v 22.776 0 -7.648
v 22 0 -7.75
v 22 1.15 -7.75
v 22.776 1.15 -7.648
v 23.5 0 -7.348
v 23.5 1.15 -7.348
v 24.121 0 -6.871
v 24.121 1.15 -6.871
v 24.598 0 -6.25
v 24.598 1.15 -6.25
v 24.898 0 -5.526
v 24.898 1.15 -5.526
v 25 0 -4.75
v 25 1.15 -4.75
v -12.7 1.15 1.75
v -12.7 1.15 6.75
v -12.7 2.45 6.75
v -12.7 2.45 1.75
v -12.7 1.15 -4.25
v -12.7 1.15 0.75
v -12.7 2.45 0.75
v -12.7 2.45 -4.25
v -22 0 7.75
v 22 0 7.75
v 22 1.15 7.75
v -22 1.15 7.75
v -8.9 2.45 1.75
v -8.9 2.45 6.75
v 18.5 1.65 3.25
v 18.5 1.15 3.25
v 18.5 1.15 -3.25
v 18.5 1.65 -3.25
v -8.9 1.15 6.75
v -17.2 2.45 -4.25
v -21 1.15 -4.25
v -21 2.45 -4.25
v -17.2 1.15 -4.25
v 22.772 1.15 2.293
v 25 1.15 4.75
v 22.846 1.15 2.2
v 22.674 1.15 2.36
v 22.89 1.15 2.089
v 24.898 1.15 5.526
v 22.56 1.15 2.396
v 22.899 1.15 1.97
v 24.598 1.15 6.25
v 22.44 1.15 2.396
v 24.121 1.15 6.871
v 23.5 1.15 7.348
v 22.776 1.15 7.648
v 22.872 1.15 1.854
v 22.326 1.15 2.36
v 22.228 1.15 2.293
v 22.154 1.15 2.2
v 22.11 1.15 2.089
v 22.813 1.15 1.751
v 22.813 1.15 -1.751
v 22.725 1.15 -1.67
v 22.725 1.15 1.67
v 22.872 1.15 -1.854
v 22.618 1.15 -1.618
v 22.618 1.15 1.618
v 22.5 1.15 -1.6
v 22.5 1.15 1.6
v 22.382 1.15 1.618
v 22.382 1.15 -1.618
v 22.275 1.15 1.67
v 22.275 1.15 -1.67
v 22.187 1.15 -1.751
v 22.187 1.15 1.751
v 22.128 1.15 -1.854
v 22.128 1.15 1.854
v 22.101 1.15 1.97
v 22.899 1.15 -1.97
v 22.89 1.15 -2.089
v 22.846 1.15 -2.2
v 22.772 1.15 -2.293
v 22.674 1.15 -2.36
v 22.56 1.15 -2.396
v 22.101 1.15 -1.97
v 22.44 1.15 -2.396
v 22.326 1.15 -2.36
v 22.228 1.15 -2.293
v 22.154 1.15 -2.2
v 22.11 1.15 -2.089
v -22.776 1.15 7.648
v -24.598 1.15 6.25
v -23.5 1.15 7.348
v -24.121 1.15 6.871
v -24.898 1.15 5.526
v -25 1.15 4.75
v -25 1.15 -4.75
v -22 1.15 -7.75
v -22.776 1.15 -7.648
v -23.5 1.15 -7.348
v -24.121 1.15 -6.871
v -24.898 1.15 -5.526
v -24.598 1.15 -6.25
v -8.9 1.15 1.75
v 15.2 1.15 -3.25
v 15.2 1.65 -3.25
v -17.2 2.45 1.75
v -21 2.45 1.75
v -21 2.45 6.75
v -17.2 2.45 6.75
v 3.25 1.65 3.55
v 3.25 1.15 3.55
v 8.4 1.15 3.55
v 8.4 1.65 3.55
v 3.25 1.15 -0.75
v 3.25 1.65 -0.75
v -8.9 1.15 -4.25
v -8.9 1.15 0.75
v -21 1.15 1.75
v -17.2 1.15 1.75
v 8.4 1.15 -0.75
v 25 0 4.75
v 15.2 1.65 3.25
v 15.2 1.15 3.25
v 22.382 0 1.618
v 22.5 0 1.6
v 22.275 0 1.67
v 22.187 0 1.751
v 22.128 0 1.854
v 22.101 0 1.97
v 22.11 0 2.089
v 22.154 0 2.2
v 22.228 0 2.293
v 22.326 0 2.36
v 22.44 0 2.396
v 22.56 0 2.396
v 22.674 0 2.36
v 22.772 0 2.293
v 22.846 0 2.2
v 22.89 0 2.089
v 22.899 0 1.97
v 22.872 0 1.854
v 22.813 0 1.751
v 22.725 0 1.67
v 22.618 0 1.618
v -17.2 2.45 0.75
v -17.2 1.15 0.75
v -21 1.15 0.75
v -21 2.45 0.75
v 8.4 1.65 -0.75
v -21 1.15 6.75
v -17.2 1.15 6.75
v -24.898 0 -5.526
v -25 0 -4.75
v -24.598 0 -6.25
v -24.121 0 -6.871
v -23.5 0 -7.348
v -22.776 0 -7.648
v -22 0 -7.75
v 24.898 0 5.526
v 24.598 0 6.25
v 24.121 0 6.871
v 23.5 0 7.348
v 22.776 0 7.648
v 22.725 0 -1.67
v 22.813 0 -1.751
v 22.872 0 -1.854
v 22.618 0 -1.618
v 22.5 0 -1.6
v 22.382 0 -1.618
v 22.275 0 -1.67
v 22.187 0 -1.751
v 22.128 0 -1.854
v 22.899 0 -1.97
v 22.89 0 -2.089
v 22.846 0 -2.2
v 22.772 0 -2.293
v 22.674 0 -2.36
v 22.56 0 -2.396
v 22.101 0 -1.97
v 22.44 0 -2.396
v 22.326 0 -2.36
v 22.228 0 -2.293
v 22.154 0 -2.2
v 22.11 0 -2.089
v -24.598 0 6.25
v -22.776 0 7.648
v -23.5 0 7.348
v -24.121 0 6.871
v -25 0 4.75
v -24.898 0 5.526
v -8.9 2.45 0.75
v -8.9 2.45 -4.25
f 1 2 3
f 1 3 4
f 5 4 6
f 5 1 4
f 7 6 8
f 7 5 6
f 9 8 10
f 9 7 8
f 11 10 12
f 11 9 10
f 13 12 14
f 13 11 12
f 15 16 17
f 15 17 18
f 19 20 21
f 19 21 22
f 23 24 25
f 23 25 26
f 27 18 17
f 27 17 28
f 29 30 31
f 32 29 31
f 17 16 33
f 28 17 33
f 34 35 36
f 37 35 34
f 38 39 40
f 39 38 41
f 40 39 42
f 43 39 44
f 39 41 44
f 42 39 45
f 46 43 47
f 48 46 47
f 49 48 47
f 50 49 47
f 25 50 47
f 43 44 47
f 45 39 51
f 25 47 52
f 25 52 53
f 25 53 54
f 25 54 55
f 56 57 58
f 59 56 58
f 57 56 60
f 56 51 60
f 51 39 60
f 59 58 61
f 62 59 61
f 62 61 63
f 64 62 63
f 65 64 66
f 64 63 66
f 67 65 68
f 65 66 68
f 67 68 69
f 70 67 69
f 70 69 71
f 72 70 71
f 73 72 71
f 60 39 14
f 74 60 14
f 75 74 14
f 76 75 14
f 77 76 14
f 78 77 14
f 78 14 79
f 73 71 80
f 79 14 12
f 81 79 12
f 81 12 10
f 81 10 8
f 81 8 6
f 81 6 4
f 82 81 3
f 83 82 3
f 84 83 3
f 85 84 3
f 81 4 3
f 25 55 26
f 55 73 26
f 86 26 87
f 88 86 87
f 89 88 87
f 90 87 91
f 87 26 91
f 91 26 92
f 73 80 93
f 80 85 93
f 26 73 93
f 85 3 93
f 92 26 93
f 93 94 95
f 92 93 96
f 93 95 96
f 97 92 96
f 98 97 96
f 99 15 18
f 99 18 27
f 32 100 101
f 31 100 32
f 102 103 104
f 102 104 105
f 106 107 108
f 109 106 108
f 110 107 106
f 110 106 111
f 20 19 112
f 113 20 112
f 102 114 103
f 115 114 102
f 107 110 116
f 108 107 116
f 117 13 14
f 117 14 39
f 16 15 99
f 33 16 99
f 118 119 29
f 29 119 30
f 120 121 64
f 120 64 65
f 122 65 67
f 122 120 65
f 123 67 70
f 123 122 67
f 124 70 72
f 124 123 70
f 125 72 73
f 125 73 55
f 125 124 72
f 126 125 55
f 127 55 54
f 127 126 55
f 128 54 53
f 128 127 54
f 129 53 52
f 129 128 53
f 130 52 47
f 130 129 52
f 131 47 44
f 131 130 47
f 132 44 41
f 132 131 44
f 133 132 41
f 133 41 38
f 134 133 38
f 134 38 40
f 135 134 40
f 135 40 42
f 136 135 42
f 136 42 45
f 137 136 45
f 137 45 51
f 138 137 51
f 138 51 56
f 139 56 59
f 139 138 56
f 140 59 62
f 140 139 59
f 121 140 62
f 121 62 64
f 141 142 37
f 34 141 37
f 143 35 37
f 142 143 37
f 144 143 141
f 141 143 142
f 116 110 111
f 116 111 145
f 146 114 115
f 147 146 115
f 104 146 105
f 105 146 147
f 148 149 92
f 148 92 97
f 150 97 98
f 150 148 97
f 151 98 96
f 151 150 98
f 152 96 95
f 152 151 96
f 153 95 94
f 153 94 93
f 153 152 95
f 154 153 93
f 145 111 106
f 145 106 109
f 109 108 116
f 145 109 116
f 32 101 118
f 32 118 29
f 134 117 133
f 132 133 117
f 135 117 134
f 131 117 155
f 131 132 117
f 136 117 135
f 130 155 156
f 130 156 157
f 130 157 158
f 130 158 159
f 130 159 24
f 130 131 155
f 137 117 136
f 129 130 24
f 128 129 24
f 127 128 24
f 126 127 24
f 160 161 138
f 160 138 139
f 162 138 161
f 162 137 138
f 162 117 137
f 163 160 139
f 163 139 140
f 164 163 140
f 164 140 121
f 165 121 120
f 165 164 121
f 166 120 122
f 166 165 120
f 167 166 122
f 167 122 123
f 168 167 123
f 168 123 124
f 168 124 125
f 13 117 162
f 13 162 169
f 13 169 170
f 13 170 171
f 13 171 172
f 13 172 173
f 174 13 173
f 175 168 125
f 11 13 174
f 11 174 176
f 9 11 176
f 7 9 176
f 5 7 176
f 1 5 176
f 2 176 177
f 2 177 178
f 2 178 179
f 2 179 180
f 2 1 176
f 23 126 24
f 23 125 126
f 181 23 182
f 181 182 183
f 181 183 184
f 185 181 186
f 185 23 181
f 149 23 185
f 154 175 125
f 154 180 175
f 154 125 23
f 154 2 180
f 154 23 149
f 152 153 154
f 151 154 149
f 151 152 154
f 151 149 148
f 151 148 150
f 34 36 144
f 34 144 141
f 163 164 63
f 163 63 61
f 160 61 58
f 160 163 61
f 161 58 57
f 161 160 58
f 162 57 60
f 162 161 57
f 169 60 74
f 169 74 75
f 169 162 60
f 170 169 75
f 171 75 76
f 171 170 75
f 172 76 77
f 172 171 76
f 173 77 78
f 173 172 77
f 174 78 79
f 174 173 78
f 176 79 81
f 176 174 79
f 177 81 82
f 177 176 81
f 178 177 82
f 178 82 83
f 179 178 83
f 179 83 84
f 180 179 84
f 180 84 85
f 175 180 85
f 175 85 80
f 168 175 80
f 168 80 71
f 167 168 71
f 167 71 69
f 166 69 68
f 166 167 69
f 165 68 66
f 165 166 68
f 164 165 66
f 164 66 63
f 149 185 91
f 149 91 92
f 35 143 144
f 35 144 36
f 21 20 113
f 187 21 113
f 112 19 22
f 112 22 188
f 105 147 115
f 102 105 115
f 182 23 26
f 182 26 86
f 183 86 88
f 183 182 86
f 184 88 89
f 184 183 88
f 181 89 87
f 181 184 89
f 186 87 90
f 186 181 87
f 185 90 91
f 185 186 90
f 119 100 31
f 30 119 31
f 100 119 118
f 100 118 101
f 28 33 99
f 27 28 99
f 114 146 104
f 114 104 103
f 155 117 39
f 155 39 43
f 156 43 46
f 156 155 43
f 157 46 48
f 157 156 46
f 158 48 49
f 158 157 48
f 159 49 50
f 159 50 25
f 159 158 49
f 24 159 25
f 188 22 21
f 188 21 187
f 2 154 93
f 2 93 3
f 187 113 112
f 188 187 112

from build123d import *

# Parameters (mm, degrees)
CROQUIS1_R                = 0.4
SALIENTE_EXTRUIR1_DEPTH   = 1.15
CROQUIS2_W                = 3.8
CROQUIS2_H                = 5
SALIENTE_EXTRUIR2_DEPTH   = 1.3
SALIENTE_EXTRUIR2_2_DEPTH = 1.3
SALIENTE_EXTRUIR2_3_DEPTH = 1.3
SALIENTE_EXTRUIR2_4_DEPTH = 1.3
CROQUIS3_W                = 5.15
CROQUIS3_H                = 4.3
SALIENTE_EXTRUIR3_DEPTH   = 0.5
CROQUIS3_W_2              = 3.3
CROQUIS3_H_2              = 6.5
SALIENTE_EXTRUIR3_2_DEPTH = 0.5


with BuildPart() as part:
    # Croquis1 → Saliente-Extruir1 (new body)
    with BuildSketch(Plane(origin=(0, 0, 0), x_dir=(1, 0, 0), z_dir=(0, 1, 0))):
        with BuildLine():
            Line((-22, 7.75), (22, 7.75))
            ThreePointArc((22, 7.75), (24.121320344, 6.871320344), (25, 4.75))
            Line((25, 4.75), (25, -4.75))
            ThreePointArc((25, -4.75), (24.121320344, -6.871320344), (22, -7.75))
            Line((22, -7.75), (-22, -7.75))
            ThreePointArc((-22, -7.75), (-24.121320344, -6.871320344), (-25, -4.75))
            Line((-25, -4.75), (-25, 4.75))
            ThreePointArc((-25, 4.75), (-24.121320344, 6.871320344), (-22, 7.75))
        make_face()
        with Locations(Location((22.5, 2, 0), (0, 0, 270))):
            Circle(CROQUIS1_R, mode=Mode.SUBTRACT)
        with Locations(Location((22.5, -2, 0), (0, 0, 90))):
            Circle(CROQUIS1_R, mode=Mode.SUBTRACT)
    extrude(amount=SALIENTE_EXTRUIR1_DEPTH)


with BuildPart() as body_2:
    # Croquis2 → Saliente-Extruir2 (new body)
    with BuildSketch(Plane(origin=(0, 1.15, 0), x_dir=(1, 0, 0), z_dir=(0, 1, 0))):
        with Locations((-19.1, 1.75)):
            Rectangle(CROQUIS2_W, CROQUIS2_H)
    extrude(amount=SALIENTE_EXTRUIR2_DEPTH)


with BuildPart() as body_3:
    # Croquis2 → Saliente-Extruir2 2 (new body)
    with BuildSketch(Plane(origin=(0, 1.15, 0), x_dir=(1, 0, 0), z_dir=(0, 1, 0))):
        with Locations((-10.8, 1.75)):
            Rectangle(CROQUIS2_W, CROQUIS2_H)
    extrude(amount=SALIENTE_EXTRUIR2_2_DEPTH)


with BuildPart() as body_4:
    # Croquis2 → Saliente-Extruir2 3 (new body)
    with BuildSketch(Plane(origin=(0, 1.15, 0), x_dir=(1, 0, 0), z_dir=(0, 1, 0))):
        with Locations((-10.8, -4.25)):
            Rectangle(CROQUIS2_W, CROQUIS2_H)
    extrude(amount=SALIENTE_EXTRUIR2_3_DEPTH)


with BuildPart() as body_5:
    # Croquis2 → Saliente-Extruir2 4 (new body)
    with BuildSketch(Plane(origin=(0, 1.15, 0), x_dir=(1, 0, 0), z_dir=(0, 1, 0))):
        with Locations((-19.1, -4.25)):
            Rectangle(CROQUIS2_W, CROQUIS2_H)
    extrude(amount=SALIENTE_EXTRUIR2_4_DEPTH)


with BuildPart() as body_6:
    # Croquis3 → Saliente-Extruir3 (new body)
    with BuildSketch(Plane(origin=(0, 1.15, 0), x_dir=(1, 0, 0), z_dir=(0, 1, 0))):
        with Locations((5.825, -1.4)):
            Rectangle(CROQUIS3_W, CROQUIS3_H)
    extrude(amount=SALIENTE_EXTRUIR3_DEPTH)


with BuildPart() as body_7:
    # Croquis3 → Saliente-Extruir3 2 (new body)
    with BuildSketch(Plane(origin=(0, 1.15, 0), x_dir=(1, 0, 0), z_dir=(0, 1, 0))):
        with Locations((16.85, 0)):
            Rectangle(CROQUIS3_W_2, CROQUIS3_H_2)
    extrude(amount=SALIENTE_EXTRUIR3_2_DEPTH)


solid = Compound([part.part, body_2.part, body_3.part, body_4.part, body_5.part, body_6.part, body_7.part])
